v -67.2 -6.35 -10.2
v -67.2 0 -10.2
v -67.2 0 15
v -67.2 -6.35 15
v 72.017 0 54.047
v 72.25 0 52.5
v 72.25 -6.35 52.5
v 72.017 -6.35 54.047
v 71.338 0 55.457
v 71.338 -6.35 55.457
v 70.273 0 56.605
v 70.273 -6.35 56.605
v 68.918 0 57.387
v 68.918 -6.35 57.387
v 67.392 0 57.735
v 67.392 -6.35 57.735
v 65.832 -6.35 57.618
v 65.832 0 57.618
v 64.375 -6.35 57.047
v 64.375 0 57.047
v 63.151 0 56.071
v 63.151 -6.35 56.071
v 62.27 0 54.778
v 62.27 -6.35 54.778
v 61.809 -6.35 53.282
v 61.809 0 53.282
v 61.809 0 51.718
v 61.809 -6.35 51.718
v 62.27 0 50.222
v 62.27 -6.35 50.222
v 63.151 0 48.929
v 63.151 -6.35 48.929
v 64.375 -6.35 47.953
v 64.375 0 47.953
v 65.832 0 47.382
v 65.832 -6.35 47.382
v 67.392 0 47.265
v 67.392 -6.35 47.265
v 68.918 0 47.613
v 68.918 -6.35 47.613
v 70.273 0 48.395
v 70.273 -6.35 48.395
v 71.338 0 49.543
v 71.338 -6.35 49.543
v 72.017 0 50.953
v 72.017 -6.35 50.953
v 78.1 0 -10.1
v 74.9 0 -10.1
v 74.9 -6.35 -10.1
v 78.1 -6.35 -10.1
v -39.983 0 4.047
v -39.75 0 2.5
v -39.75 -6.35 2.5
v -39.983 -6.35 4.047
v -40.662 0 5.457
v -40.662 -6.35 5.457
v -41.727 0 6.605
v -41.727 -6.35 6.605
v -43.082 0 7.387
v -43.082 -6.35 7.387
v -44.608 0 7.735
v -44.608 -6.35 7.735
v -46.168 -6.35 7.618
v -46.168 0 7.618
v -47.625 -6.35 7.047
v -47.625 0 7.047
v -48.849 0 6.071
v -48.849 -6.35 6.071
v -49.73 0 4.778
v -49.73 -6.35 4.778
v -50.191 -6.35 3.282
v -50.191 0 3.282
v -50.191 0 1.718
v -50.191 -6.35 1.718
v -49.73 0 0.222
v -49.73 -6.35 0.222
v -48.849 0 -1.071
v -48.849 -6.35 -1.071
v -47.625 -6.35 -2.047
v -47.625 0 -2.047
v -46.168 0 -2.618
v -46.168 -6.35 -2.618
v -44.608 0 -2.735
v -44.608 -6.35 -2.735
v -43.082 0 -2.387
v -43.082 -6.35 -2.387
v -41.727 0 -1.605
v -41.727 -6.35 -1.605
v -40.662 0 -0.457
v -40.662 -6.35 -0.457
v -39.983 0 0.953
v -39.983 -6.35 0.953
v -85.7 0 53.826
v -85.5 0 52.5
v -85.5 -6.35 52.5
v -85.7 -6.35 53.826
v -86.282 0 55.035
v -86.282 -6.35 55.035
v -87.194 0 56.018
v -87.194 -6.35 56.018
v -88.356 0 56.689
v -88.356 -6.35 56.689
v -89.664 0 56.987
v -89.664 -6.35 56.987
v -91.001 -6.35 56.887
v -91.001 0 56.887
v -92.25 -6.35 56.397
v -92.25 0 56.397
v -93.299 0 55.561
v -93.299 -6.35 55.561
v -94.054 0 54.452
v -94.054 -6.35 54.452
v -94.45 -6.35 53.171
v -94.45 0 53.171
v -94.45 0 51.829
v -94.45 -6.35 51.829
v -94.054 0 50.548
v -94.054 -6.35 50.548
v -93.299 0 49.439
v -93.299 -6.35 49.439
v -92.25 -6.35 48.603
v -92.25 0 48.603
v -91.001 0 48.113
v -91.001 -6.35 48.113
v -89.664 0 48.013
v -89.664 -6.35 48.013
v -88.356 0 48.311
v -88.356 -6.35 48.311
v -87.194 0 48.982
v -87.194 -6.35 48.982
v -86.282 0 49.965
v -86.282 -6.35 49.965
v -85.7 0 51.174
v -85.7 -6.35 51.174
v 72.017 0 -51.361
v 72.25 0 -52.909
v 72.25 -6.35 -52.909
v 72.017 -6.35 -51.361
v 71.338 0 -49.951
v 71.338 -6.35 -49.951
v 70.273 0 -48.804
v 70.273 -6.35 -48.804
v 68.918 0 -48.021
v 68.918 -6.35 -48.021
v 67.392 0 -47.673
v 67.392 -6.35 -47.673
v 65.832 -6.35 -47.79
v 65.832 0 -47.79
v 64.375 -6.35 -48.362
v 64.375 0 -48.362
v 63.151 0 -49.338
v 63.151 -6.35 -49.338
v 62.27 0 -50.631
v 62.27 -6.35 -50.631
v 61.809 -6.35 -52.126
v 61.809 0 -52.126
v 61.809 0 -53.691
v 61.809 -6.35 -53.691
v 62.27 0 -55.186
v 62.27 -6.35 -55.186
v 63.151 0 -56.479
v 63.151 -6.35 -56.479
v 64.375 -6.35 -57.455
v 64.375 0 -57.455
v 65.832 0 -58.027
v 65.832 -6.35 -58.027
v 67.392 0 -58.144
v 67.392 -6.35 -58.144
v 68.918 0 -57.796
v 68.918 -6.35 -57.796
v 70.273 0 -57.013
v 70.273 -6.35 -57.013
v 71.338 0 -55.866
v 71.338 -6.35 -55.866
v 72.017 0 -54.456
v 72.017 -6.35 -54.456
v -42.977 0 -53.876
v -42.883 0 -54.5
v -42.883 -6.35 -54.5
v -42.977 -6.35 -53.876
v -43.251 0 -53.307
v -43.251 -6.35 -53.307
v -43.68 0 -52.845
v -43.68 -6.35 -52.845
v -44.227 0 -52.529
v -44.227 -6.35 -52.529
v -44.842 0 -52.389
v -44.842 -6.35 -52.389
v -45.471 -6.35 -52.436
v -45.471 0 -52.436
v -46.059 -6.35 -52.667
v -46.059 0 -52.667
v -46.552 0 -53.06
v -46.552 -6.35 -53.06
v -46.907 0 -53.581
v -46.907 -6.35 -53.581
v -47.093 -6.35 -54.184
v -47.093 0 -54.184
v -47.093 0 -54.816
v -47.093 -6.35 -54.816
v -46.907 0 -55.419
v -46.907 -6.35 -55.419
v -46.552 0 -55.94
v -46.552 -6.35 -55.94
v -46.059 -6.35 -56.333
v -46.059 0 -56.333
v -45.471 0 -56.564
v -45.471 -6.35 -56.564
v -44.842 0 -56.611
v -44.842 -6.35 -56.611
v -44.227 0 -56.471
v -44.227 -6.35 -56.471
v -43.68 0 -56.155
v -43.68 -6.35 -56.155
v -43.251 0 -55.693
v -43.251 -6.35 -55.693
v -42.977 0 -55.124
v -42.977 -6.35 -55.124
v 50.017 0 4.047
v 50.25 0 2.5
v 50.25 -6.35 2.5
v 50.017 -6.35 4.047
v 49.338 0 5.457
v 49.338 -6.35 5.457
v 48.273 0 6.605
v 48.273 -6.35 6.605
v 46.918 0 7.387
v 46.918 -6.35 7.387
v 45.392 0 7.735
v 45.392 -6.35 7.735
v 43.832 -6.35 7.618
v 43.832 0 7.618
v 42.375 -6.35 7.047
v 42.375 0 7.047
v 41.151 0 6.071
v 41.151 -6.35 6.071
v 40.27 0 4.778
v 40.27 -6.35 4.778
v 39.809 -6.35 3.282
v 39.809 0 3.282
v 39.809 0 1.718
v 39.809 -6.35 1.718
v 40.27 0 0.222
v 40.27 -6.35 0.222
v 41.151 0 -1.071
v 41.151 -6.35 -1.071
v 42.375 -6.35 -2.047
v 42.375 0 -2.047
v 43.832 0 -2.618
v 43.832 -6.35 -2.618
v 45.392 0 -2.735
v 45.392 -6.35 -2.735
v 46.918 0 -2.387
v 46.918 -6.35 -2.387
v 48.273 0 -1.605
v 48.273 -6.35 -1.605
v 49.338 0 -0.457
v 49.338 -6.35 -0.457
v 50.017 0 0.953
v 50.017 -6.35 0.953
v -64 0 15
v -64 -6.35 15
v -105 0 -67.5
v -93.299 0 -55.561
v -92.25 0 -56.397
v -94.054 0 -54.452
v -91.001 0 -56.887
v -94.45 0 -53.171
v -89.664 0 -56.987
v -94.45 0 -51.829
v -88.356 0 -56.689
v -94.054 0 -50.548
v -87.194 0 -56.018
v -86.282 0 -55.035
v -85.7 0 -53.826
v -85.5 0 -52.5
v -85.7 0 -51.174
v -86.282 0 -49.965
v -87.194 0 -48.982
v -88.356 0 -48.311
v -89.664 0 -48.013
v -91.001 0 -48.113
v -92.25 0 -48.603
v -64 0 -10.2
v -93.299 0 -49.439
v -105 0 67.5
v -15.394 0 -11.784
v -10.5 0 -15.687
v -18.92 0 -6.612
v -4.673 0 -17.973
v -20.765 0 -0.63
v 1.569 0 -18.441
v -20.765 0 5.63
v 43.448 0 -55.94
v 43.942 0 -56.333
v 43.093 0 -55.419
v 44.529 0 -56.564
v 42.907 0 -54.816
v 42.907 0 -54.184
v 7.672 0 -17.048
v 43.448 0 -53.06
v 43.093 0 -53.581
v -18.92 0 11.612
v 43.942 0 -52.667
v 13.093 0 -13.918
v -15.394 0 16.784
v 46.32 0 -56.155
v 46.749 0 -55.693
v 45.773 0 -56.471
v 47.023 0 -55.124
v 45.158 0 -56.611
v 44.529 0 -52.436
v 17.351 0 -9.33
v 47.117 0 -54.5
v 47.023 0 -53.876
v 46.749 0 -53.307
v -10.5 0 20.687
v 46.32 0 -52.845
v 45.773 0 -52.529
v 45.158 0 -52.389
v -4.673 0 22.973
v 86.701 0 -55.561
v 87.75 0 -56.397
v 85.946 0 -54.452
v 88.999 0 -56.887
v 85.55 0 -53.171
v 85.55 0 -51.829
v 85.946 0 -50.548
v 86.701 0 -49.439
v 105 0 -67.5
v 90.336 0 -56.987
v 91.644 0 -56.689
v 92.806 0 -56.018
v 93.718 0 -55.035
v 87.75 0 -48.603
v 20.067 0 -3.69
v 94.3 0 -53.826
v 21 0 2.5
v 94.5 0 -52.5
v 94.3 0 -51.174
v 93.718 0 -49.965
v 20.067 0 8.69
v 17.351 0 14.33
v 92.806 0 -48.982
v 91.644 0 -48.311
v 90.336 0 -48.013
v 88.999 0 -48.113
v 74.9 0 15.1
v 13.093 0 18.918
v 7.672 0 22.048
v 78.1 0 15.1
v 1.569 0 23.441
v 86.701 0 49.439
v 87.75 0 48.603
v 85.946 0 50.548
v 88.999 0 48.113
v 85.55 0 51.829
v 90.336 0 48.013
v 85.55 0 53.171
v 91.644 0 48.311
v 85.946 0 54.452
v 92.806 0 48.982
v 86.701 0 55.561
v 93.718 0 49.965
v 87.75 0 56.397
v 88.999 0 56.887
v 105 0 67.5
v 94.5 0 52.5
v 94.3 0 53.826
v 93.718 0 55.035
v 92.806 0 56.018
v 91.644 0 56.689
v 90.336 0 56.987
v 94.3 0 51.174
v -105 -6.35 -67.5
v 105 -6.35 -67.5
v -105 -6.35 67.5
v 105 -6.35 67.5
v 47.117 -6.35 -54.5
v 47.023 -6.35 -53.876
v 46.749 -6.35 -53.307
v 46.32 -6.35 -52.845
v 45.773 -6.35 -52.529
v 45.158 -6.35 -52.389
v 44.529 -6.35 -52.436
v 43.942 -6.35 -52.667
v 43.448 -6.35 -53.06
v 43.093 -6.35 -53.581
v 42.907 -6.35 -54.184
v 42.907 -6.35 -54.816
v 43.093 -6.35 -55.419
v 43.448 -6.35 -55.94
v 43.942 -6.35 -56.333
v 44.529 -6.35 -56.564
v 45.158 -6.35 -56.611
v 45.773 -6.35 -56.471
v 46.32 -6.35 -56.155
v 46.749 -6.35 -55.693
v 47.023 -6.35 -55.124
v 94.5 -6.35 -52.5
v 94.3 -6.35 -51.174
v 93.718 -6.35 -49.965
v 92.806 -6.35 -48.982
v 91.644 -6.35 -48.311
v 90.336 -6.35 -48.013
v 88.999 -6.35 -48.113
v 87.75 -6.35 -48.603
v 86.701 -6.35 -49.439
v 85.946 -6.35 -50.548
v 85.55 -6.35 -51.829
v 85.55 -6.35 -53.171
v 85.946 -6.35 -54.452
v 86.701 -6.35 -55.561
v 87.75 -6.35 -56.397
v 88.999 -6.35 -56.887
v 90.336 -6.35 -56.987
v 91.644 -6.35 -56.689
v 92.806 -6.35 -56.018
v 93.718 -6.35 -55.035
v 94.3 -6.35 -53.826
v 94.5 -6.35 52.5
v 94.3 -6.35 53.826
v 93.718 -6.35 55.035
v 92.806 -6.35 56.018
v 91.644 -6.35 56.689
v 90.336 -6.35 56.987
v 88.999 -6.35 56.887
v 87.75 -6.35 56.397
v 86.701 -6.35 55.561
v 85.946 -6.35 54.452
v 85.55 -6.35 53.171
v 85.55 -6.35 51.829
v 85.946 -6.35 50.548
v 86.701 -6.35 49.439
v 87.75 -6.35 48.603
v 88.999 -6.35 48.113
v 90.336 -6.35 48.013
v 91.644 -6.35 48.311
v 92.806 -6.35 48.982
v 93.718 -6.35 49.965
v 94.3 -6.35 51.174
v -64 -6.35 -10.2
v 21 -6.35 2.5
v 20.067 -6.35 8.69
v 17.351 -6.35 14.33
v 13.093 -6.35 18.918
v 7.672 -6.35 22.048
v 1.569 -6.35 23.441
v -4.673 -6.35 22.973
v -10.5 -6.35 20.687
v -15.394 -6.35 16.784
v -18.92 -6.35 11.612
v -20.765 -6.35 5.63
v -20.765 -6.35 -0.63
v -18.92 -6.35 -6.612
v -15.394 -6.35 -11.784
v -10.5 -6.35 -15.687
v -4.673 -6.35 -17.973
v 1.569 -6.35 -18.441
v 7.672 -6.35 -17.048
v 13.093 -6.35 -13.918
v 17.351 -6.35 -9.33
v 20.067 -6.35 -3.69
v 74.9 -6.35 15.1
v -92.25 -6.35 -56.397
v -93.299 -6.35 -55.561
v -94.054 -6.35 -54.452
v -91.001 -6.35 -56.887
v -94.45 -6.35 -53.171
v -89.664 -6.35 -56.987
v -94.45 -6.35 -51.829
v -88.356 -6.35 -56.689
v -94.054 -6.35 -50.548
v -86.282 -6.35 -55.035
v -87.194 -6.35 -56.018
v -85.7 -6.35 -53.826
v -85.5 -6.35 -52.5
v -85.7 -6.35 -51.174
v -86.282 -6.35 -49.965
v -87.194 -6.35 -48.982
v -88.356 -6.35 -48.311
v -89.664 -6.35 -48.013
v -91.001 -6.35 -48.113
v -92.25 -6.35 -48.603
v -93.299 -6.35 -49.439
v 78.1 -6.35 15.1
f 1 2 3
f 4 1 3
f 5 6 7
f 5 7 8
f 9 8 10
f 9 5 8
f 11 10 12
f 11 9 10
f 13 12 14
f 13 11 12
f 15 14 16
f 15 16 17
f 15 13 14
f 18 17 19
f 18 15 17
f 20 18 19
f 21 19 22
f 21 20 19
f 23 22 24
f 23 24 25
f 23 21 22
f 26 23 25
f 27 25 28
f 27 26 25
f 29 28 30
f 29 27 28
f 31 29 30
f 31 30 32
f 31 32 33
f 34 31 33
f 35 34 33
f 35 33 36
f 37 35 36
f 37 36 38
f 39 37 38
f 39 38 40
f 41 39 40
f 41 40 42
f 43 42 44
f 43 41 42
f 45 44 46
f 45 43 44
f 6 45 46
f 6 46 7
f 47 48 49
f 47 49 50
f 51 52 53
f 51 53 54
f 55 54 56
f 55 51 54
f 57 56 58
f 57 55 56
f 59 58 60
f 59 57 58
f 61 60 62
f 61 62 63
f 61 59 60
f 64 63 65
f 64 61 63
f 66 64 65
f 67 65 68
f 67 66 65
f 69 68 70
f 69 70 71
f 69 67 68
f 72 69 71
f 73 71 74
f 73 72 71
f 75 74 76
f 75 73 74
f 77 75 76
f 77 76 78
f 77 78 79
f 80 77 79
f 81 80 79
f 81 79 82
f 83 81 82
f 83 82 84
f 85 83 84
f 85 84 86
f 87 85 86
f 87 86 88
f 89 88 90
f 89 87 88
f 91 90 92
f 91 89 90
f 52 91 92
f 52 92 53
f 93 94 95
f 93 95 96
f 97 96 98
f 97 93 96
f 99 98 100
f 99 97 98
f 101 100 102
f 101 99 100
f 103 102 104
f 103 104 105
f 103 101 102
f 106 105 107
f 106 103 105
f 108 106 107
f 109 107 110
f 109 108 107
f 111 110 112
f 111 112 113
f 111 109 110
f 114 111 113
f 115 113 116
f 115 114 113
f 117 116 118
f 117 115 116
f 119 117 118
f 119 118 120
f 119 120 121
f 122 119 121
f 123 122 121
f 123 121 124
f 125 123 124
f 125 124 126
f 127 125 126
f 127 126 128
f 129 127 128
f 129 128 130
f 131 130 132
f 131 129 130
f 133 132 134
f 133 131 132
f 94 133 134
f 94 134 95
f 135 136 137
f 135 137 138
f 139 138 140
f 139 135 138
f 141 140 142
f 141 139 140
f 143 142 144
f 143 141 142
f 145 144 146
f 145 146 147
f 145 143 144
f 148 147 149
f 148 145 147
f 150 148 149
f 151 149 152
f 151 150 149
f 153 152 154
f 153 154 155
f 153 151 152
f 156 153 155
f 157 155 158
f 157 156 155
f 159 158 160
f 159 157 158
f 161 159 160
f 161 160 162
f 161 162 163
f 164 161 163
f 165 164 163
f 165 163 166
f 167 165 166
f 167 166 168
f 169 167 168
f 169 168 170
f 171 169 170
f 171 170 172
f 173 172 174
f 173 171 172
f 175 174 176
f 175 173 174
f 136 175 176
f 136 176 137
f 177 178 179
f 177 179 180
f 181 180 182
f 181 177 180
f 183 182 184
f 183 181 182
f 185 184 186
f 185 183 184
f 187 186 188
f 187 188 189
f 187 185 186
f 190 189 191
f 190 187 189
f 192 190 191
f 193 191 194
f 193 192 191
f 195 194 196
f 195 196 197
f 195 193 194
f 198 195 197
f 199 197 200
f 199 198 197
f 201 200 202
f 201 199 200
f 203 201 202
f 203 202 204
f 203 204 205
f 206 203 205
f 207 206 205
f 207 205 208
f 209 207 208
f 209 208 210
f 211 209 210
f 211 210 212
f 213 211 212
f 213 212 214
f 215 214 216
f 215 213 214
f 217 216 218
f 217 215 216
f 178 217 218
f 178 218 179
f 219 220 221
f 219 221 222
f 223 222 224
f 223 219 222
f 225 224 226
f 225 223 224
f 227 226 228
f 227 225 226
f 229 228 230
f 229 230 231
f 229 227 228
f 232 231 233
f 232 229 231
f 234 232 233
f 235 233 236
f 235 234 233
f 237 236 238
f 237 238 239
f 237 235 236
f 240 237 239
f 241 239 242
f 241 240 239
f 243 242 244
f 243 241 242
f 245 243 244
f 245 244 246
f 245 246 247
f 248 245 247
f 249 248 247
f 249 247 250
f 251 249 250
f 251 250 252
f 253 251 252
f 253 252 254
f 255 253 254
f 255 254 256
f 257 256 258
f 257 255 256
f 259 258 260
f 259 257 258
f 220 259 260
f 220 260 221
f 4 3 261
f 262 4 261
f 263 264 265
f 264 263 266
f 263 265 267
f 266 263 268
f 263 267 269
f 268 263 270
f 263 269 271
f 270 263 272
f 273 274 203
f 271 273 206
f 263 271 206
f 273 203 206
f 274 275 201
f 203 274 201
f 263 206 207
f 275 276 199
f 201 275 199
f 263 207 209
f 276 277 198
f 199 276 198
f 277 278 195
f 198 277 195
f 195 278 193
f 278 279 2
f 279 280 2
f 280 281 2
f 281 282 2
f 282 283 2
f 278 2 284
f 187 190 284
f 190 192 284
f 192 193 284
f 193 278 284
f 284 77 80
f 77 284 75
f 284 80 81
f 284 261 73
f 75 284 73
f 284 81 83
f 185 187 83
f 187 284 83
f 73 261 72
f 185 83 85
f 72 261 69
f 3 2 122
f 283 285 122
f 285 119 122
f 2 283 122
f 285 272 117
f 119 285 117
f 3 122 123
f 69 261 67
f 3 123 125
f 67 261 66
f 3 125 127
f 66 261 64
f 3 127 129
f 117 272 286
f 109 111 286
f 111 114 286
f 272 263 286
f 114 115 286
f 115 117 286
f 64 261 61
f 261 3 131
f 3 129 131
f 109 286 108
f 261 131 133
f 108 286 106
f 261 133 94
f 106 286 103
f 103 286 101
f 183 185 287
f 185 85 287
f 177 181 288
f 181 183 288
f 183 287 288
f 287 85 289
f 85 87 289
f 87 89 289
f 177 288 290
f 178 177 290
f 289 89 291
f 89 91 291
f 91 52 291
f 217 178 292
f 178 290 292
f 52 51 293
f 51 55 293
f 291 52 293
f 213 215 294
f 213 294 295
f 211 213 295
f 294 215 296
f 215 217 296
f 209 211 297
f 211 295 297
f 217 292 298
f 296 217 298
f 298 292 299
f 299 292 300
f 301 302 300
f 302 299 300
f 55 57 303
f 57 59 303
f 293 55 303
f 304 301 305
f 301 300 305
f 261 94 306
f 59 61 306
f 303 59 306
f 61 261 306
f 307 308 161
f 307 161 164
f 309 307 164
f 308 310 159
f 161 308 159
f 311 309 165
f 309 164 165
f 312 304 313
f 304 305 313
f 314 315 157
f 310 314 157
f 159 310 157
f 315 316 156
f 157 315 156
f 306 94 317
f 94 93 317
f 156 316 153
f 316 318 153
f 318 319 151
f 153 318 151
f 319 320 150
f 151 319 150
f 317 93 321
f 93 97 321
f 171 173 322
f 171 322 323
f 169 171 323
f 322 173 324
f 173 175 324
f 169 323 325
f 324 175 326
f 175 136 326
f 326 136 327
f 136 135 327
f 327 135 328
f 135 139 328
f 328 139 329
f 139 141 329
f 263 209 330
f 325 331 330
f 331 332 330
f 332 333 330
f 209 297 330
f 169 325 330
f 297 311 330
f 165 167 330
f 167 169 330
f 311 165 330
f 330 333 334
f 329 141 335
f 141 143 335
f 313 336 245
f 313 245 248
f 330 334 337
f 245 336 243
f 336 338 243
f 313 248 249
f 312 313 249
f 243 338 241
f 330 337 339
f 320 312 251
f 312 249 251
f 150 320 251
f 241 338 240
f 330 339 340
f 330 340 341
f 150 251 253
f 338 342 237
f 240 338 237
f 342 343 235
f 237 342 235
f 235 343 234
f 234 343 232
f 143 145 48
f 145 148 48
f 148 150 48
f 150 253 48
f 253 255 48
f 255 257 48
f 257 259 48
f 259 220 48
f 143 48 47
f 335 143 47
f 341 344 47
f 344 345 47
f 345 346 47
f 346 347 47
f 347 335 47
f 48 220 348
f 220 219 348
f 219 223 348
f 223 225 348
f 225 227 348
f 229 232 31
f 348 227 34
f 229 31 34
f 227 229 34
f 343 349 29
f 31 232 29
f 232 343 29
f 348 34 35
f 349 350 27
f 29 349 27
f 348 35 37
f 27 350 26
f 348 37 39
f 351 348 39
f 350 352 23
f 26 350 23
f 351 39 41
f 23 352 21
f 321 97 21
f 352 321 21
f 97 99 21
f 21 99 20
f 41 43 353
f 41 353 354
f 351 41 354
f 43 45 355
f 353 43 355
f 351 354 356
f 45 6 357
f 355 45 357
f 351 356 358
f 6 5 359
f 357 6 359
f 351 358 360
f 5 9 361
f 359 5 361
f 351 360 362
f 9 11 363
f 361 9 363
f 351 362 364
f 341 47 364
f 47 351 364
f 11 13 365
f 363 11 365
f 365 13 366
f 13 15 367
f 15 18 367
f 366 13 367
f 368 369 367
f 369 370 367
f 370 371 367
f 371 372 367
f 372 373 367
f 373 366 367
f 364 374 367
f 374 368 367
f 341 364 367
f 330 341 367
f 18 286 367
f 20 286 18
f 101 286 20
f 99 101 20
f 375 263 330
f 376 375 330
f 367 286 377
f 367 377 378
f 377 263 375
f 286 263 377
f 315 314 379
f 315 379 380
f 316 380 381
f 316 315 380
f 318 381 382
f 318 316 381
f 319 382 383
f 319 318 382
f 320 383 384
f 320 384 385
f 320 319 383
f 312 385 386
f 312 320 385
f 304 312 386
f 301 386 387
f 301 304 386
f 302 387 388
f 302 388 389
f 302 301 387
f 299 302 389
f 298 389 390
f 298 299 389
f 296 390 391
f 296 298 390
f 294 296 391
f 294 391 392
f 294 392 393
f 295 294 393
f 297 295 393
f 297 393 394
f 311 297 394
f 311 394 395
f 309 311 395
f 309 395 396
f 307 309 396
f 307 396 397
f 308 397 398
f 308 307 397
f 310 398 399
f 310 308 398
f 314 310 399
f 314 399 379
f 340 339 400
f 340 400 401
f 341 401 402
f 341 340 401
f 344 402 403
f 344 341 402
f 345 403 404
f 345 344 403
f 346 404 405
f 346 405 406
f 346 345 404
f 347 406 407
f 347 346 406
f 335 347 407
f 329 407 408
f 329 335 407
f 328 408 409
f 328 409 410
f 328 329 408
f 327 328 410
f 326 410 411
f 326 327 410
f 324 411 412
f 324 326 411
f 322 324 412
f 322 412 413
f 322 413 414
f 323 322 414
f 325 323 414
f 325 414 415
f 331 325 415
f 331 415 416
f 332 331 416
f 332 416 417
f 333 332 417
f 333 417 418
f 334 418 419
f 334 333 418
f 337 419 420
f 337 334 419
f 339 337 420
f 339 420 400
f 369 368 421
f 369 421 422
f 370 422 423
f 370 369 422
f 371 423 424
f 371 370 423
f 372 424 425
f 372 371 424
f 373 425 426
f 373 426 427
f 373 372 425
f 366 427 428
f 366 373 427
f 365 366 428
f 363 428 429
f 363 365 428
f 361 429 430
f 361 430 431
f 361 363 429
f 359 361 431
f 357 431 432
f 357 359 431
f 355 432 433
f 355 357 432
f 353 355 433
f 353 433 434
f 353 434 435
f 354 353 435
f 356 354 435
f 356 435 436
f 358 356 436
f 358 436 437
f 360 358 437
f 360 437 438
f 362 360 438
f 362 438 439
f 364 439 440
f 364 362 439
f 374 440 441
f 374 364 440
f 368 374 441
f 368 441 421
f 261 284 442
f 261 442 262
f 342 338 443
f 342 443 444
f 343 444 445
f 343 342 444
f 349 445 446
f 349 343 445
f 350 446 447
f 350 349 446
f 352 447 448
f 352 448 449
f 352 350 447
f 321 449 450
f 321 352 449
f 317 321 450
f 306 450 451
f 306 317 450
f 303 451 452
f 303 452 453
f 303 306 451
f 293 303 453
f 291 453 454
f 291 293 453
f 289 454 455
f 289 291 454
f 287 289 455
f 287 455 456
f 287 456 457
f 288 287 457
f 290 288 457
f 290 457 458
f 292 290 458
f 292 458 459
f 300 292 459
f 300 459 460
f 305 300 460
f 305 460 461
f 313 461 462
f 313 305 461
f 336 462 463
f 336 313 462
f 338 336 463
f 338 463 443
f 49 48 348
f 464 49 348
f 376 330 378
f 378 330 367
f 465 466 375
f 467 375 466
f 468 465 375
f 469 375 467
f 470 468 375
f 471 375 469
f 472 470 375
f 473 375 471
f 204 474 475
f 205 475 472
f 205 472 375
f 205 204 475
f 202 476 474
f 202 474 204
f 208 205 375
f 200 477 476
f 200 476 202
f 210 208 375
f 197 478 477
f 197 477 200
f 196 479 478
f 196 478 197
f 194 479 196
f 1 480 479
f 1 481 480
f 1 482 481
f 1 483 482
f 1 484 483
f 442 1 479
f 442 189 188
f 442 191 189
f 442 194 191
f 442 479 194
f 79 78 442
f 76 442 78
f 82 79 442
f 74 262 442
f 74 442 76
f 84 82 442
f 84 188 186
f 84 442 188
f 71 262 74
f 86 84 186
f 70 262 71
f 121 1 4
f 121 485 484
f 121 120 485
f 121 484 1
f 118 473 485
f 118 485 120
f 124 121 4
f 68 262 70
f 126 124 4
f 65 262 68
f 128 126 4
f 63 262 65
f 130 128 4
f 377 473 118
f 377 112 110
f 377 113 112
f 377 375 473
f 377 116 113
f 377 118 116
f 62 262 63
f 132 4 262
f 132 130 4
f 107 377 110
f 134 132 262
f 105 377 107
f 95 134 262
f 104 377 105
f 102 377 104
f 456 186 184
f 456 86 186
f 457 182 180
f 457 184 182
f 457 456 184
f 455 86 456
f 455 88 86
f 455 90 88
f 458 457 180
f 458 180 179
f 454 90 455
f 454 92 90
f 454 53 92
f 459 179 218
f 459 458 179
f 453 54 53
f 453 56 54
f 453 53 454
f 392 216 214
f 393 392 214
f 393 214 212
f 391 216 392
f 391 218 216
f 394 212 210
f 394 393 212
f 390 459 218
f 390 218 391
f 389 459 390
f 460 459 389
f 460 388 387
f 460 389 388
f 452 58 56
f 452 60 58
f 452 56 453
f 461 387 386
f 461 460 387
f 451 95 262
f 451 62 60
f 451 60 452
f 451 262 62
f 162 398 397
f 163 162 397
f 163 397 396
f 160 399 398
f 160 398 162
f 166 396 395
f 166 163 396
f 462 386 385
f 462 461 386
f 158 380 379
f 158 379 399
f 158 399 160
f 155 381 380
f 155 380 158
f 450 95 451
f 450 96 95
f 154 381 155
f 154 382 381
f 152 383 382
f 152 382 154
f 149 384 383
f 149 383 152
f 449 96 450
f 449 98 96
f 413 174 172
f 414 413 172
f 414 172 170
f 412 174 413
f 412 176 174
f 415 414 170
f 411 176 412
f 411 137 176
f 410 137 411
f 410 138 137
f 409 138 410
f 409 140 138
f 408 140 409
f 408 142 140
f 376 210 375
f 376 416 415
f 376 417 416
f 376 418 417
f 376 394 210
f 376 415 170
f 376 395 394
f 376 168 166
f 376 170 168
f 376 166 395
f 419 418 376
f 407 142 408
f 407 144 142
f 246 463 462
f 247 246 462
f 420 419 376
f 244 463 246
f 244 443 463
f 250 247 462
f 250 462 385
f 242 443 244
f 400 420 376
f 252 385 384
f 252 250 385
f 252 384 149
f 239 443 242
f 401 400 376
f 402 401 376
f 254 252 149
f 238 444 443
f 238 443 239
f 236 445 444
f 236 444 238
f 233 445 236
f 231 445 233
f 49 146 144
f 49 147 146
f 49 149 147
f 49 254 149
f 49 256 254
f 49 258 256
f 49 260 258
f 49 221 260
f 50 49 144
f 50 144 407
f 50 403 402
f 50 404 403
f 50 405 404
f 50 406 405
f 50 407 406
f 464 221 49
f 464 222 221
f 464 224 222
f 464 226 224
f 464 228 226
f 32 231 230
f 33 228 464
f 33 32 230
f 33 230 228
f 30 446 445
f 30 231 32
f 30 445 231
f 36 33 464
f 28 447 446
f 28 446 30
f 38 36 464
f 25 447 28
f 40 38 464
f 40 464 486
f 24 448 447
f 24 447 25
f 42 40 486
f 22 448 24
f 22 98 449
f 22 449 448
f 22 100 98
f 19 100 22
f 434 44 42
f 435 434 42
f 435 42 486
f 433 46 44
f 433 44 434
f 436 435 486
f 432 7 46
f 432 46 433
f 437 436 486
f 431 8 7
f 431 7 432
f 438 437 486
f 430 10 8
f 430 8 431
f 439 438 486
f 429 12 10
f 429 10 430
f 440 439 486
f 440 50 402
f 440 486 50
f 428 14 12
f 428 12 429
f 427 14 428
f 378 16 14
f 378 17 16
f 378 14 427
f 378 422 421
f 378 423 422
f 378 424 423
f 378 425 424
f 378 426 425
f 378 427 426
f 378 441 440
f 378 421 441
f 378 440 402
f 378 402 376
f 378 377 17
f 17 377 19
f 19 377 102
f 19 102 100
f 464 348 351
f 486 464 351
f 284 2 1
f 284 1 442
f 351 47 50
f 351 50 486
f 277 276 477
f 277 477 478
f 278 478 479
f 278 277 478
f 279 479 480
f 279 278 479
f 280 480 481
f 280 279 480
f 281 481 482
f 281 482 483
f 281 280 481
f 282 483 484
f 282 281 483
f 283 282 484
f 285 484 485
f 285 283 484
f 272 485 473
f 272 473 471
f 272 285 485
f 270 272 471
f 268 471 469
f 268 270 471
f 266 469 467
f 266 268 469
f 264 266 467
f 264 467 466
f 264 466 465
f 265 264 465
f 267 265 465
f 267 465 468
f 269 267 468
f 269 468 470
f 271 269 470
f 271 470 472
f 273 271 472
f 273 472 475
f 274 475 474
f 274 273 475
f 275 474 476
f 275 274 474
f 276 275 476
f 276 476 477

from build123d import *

# Parameters (mm, degrees)
F0_W     = 209.999986
F0_H     = 135.000009
F0_R     = 4.499991
F0_R_2   = 2.116988
F0_R_3   = 5.250002
F0_W_2   = 3.199994
F0_H_2   = 25.2
F0_R_4   = 21.000009
F0_W_3   = 3.199993
F1_DEPTH = 6.35


with BuildPart() as f1:
    # F0 (on Front) → F1 (new body)
    with BuildSketch(Plane.XZ):
        with Locations((0, -1.3e-05)):
            Rectangle(F0_W, F0_H)
        with Locations((-89.999998, -52.499997)):
            Circle(F0_R, mode=Mode.SUBTRACT)
        with Locations((-45.000012, -54.500018)):
            Circle(F0_R_2, mode=Mode.SUBTRACT)
        with Locations((45.000012, -54.500018)):
            Circle(F0_R_2, mode=Mode.SUBTRACT)
        with Locations((66.999993, -52.908505)):
            Circle(F0_R_3, mode=Mode.SUBTRACT)
        with Locations((89.999998, -52.499997)):
            Circle(F0_R, mode=Mode.SUBTRACT)
        with Locations((-65.599996, 2.399995)):
            Rectangle(F0_W_2, F0_H_2, mode=Mode.SUBTRACT)
        with Locations((-44.999986, 2.499995)):
            Circle(F0_R_3, mode=Mode.SUBTRACT)
        with Locations((0, 2.499995)):
            Circle(F0_R_4, mode=Mode.SUBTRACT)
        with Locations((-89.999998, 52.499997)):
            Circle(F0_R, mode=Mode.SUBTRACT)
        with Locations((45.000012, 2.499995)):
            Circle(F0_R_3, mode=Mode.SUBTRACT)
        with Locations((76.5, 2.499995)):
            Rectangle(F0_W_3, F0_H_2, mode=Mode.SUBTRACT)
        with Locations((66.999993, 52.499997)):
            Circle(F0_R_3, mode=Mode.SUBTRACT)
        with Locations((89.999998, 52.499997)):
            Circle(F0_R, mode=Mode.SUBTRACT)
    extrude(amount=F1_DEPTH)


solid = f1.part
